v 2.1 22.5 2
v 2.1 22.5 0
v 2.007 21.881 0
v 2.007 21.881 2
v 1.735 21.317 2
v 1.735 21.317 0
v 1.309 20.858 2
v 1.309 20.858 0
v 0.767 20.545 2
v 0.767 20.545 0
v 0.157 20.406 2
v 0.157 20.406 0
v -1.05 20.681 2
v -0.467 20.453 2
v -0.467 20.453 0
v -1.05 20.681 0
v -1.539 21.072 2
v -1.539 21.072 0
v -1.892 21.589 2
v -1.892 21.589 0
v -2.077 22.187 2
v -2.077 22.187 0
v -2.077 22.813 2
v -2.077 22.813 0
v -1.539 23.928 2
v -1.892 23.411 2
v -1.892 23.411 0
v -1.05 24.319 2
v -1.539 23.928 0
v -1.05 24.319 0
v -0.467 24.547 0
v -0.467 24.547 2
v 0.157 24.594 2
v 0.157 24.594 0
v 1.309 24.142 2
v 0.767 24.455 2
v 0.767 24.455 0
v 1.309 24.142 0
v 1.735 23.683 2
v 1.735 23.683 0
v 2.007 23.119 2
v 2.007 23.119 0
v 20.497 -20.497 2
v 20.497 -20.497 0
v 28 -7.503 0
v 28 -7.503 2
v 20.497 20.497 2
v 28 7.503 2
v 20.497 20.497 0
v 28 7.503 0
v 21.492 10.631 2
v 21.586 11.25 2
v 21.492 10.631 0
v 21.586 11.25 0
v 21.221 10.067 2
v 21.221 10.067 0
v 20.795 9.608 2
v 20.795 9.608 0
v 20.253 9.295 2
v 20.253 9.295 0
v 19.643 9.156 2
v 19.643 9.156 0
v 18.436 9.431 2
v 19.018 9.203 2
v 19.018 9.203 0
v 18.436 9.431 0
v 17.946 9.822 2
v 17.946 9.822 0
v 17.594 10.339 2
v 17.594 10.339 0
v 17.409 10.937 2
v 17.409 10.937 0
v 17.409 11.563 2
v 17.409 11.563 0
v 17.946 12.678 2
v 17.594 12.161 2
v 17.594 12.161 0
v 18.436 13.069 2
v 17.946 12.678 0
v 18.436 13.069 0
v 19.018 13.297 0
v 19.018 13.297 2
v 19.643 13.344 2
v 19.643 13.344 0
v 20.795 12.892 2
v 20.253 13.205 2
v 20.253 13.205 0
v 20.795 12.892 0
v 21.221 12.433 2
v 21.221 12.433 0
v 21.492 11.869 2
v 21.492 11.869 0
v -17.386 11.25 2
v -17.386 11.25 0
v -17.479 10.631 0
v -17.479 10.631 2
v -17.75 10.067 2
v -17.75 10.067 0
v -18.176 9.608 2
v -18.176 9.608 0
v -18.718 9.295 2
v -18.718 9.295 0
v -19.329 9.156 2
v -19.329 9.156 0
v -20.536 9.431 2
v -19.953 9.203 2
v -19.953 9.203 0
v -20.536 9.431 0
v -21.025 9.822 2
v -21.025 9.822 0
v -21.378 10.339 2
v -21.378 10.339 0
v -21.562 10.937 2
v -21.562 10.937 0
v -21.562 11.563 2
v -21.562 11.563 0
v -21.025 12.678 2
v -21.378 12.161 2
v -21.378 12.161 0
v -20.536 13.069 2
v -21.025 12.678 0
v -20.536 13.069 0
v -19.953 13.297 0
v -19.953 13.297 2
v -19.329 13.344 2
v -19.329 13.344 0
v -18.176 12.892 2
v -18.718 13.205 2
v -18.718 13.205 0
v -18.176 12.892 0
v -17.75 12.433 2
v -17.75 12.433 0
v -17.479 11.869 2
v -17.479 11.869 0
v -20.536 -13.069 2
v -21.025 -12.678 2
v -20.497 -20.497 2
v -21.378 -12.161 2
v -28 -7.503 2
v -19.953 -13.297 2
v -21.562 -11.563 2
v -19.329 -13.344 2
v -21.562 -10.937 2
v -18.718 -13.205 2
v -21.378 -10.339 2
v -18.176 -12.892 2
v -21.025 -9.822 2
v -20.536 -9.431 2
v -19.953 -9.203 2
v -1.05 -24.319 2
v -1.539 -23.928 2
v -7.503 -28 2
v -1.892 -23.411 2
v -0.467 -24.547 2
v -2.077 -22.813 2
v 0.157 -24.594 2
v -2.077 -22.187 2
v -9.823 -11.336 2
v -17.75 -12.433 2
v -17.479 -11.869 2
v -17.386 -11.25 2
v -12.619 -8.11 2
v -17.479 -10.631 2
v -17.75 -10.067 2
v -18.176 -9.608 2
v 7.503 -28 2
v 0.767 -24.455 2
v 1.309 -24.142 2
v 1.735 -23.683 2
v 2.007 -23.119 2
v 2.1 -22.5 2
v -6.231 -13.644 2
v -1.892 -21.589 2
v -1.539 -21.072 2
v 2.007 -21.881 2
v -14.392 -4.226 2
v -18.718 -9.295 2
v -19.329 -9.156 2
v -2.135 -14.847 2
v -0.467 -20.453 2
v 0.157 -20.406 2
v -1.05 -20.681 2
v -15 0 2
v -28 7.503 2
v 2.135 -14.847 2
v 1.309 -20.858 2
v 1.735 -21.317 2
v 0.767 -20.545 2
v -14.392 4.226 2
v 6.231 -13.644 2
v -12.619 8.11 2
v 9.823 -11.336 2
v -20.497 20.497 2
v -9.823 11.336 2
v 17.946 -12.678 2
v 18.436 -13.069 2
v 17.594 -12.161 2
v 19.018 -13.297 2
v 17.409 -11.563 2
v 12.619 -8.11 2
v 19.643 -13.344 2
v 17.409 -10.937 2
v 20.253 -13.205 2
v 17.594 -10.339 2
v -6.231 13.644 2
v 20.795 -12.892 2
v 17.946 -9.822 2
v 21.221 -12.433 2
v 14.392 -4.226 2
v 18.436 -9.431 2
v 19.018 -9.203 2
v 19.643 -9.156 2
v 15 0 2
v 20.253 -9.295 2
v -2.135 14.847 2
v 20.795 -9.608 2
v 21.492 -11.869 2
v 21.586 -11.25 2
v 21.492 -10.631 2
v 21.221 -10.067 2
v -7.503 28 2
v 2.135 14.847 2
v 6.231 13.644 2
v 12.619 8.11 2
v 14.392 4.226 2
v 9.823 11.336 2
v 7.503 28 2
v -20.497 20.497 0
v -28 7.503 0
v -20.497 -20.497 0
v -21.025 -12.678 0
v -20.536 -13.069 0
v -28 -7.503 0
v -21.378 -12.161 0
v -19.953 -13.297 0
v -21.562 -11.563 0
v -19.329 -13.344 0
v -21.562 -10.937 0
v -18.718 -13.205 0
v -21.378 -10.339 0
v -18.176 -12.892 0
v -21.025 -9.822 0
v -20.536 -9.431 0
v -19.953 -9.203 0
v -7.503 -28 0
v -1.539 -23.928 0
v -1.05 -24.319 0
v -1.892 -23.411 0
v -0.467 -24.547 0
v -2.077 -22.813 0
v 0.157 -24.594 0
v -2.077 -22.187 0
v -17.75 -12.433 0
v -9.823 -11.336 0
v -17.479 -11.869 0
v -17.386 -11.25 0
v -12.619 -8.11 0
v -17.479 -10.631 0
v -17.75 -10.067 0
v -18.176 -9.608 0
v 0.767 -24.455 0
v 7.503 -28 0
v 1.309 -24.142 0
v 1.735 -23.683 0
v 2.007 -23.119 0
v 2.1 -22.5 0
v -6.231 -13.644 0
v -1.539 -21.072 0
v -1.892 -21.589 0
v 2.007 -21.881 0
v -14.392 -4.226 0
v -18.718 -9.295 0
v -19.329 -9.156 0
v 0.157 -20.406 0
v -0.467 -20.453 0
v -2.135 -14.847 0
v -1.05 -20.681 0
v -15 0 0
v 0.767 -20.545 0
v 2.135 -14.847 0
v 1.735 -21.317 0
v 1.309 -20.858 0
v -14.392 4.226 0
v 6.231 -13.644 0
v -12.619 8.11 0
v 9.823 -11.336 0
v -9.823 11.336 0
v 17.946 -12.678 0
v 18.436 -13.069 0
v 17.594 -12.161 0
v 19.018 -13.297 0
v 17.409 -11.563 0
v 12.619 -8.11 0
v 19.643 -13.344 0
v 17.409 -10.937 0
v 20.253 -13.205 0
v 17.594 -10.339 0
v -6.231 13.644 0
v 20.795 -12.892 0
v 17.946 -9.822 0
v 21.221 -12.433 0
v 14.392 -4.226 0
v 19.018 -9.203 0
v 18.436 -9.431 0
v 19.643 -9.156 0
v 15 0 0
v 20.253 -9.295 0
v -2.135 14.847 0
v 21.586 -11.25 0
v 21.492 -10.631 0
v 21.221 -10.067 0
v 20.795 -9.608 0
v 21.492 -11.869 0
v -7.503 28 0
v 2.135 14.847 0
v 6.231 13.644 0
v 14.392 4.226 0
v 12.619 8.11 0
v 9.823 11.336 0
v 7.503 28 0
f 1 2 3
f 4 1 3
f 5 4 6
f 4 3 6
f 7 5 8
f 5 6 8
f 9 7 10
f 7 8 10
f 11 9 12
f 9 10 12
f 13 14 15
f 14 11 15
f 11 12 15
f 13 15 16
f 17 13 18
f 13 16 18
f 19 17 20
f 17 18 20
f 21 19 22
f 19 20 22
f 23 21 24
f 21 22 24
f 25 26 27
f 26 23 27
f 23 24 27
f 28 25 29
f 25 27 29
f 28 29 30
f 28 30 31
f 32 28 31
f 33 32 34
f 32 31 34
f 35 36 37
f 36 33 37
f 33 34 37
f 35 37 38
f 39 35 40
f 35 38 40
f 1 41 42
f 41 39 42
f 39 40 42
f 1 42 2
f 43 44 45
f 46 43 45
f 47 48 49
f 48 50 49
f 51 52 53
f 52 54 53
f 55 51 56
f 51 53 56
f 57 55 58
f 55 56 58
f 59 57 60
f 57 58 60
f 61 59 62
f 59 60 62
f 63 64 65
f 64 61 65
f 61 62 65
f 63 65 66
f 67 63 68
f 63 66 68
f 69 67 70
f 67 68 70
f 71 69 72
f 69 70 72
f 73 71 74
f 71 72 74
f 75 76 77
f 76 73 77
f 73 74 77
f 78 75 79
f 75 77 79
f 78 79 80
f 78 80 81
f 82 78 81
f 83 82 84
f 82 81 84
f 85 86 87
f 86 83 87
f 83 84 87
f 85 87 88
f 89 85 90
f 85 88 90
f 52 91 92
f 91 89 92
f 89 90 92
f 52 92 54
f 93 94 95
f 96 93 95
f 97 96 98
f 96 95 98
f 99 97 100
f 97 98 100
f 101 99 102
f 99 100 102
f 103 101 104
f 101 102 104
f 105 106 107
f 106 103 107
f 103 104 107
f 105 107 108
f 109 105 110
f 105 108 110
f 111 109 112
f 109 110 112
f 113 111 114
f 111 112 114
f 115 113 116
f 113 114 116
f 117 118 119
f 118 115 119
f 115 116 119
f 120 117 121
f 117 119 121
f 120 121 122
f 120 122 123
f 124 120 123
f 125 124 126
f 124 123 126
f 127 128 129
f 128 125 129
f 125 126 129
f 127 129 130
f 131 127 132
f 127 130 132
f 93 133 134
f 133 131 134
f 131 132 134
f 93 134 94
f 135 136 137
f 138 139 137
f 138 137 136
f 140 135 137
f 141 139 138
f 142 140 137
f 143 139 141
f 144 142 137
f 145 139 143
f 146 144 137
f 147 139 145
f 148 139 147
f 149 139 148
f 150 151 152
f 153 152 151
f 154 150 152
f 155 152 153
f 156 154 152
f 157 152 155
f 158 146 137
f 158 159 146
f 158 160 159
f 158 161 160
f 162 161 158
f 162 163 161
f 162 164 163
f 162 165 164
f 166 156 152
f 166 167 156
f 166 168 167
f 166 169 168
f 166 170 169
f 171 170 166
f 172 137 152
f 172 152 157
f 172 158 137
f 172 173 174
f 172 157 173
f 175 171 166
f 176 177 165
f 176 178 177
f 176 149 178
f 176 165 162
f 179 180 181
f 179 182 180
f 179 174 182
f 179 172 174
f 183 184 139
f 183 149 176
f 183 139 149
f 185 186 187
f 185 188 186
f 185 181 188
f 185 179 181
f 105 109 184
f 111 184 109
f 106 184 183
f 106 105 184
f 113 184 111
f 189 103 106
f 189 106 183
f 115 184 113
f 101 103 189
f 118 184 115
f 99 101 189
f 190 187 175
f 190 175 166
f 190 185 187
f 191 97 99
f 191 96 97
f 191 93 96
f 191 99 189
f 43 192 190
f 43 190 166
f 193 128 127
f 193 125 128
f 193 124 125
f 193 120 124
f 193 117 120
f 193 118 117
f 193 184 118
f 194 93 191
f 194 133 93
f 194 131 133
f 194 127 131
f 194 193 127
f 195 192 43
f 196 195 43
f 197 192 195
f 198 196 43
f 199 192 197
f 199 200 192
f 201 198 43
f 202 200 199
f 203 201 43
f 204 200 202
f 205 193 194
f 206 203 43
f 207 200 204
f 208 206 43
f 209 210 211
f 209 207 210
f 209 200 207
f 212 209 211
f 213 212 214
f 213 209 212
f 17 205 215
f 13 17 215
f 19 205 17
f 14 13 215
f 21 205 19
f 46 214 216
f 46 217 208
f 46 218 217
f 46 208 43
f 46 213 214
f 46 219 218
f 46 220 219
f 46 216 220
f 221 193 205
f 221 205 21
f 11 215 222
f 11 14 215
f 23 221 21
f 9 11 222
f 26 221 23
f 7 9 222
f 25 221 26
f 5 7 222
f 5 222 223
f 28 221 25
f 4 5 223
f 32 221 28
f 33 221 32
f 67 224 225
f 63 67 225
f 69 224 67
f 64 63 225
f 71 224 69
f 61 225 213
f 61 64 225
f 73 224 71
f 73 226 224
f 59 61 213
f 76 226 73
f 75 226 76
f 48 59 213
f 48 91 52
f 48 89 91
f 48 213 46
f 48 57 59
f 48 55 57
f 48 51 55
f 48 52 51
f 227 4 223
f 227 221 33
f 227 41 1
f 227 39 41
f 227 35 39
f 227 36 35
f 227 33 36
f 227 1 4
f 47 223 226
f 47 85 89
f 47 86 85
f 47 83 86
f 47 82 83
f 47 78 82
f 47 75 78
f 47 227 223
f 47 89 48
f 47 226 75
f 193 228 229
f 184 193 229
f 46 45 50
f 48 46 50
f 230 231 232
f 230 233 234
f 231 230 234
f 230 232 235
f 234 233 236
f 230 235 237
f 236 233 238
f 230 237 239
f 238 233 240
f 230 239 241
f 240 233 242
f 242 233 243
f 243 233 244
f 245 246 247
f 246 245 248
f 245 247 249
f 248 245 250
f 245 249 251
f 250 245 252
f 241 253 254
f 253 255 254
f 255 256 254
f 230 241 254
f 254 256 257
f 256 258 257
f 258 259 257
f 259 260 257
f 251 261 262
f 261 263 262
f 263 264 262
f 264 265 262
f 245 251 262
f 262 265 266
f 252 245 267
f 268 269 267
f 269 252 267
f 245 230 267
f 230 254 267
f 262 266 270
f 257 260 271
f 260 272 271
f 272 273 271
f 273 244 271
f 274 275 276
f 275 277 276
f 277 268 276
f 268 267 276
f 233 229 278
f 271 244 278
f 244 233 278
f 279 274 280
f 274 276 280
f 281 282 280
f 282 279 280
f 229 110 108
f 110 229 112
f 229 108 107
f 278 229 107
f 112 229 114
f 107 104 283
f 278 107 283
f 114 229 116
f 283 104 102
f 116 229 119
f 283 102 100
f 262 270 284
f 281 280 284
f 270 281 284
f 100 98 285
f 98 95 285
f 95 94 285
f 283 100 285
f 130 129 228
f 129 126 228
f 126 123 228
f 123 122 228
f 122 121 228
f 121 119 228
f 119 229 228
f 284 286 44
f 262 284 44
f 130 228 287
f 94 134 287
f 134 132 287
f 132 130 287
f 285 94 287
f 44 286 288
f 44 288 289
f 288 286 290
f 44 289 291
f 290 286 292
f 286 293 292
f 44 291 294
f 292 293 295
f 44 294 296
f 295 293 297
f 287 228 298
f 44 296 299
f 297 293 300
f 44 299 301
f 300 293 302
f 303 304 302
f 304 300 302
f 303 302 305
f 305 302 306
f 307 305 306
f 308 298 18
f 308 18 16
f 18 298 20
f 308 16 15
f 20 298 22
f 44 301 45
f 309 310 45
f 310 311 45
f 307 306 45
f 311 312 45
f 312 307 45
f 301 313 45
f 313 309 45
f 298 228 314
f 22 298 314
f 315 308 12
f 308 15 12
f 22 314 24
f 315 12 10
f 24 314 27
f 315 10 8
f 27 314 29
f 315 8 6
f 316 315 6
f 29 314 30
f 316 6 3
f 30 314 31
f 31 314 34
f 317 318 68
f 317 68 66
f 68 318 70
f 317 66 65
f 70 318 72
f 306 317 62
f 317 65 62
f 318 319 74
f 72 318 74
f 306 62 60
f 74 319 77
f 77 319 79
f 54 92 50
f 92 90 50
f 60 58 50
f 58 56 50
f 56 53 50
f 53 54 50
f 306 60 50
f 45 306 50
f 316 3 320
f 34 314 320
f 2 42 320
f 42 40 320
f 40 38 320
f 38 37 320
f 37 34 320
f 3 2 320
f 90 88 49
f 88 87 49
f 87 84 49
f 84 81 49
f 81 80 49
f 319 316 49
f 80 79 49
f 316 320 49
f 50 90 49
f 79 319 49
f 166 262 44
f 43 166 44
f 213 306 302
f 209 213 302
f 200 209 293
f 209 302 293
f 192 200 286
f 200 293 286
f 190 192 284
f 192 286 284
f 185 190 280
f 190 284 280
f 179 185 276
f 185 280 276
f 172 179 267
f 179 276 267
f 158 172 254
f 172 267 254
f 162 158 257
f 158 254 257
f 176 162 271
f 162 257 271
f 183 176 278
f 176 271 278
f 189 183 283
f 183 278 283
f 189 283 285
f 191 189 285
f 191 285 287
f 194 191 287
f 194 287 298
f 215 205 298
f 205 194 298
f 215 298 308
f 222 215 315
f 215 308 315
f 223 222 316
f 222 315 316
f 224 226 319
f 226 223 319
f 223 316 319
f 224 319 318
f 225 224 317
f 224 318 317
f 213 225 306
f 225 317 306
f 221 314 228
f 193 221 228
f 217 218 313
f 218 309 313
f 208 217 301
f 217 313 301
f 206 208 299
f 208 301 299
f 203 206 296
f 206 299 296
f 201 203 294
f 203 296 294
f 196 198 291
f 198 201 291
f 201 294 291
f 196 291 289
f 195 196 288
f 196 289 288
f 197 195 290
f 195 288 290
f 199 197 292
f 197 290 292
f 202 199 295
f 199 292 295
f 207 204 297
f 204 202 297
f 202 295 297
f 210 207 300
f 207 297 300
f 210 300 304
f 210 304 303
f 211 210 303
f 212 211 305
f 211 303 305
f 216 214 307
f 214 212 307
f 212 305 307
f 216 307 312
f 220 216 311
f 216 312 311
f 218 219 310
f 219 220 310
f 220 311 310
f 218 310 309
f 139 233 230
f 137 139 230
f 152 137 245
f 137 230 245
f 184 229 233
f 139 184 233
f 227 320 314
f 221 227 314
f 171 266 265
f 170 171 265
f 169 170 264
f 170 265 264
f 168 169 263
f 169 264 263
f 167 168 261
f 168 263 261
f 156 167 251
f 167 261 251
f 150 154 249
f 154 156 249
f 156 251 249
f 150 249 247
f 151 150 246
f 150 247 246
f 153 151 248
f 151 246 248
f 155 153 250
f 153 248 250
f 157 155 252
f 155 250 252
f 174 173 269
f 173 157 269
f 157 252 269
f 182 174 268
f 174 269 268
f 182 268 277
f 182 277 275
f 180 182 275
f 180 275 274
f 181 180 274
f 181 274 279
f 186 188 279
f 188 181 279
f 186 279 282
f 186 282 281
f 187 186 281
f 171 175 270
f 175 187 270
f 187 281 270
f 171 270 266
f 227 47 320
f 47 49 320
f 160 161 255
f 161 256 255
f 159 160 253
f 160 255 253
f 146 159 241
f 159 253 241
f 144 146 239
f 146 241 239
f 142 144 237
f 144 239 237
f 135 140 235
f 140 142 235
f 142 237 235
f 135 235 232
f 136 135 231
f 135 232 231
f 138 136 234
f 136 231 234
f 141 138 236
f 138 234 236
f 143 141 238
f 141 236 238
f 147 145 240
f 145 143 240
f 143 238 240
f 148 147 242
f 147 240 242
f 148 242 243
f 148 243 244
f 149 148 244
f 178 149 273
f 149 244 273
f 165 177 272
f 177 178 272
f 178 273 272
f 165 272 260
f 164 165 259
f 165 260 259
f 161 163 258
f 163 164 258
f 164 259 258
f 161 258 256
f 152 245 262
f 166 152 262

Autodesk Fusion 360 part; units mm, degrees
sketch "Sketch1" plane through (0, 0, 0) normal (0, 0, 1) x (1, 0, 0)
  line L0 (-7.5026, 28) -> (-20.4974, 20.4974)
  line L1 (-20.4974, 20.4974) -> (-28, 7.5026)
  line L2 (-28, 7.5026) -> (-28, -7.5026)
  line L3 (-28, -7.5026) -> (-20.4974, -20.4974)
  line L4 (-20.4974, -20.4974) -> (-7.5026, -28)
  line L5 (-7.5026, -28) -> (7.5026, -28)
  line L6 (7.5026, -28) -> (20.4974, -20.4974)
  line L7 (20.4974, -20.4974) -> (28, -7.5026)
  line L8 (28, -7.5026) -> (28, 7.5026)
  line L9 (28, 7.5026) -> (20.4974, 20.4974)
  line L10 (20.4974, 20.4974) -> (7.5026, 28)
  line L11 (7.5026, 28) -> (-7.5026, 28)
  circle A0 centre (0, 0) radius 22.5 construction
  line L12 (0, 0) -> (0, 28) construction
  circle A1 centre (0, 22.5) radius 2.1
  circle A2 centre (-19.4856, 11.25) radius 2.1
  circle A3 centre (-19.4856, -11.25) radius 2.1
  circle A4 centre (0, -22.5) radius 2.1
  circle A5 centre (19.4856, -11.25) radius 2.1
  circle A6 centre (19.4856, 11.25) radius 2.1
  circle A7 centre (0, 0) radius 15
  dimension "d1" = 28
  dimension "d2" = 45
  dimension "d3" = 4.2
  dimension "d5" = 360
  dimension "d6" = 30
extrude "Extrude1" add sketch "Sketch1" along normal blind 2
